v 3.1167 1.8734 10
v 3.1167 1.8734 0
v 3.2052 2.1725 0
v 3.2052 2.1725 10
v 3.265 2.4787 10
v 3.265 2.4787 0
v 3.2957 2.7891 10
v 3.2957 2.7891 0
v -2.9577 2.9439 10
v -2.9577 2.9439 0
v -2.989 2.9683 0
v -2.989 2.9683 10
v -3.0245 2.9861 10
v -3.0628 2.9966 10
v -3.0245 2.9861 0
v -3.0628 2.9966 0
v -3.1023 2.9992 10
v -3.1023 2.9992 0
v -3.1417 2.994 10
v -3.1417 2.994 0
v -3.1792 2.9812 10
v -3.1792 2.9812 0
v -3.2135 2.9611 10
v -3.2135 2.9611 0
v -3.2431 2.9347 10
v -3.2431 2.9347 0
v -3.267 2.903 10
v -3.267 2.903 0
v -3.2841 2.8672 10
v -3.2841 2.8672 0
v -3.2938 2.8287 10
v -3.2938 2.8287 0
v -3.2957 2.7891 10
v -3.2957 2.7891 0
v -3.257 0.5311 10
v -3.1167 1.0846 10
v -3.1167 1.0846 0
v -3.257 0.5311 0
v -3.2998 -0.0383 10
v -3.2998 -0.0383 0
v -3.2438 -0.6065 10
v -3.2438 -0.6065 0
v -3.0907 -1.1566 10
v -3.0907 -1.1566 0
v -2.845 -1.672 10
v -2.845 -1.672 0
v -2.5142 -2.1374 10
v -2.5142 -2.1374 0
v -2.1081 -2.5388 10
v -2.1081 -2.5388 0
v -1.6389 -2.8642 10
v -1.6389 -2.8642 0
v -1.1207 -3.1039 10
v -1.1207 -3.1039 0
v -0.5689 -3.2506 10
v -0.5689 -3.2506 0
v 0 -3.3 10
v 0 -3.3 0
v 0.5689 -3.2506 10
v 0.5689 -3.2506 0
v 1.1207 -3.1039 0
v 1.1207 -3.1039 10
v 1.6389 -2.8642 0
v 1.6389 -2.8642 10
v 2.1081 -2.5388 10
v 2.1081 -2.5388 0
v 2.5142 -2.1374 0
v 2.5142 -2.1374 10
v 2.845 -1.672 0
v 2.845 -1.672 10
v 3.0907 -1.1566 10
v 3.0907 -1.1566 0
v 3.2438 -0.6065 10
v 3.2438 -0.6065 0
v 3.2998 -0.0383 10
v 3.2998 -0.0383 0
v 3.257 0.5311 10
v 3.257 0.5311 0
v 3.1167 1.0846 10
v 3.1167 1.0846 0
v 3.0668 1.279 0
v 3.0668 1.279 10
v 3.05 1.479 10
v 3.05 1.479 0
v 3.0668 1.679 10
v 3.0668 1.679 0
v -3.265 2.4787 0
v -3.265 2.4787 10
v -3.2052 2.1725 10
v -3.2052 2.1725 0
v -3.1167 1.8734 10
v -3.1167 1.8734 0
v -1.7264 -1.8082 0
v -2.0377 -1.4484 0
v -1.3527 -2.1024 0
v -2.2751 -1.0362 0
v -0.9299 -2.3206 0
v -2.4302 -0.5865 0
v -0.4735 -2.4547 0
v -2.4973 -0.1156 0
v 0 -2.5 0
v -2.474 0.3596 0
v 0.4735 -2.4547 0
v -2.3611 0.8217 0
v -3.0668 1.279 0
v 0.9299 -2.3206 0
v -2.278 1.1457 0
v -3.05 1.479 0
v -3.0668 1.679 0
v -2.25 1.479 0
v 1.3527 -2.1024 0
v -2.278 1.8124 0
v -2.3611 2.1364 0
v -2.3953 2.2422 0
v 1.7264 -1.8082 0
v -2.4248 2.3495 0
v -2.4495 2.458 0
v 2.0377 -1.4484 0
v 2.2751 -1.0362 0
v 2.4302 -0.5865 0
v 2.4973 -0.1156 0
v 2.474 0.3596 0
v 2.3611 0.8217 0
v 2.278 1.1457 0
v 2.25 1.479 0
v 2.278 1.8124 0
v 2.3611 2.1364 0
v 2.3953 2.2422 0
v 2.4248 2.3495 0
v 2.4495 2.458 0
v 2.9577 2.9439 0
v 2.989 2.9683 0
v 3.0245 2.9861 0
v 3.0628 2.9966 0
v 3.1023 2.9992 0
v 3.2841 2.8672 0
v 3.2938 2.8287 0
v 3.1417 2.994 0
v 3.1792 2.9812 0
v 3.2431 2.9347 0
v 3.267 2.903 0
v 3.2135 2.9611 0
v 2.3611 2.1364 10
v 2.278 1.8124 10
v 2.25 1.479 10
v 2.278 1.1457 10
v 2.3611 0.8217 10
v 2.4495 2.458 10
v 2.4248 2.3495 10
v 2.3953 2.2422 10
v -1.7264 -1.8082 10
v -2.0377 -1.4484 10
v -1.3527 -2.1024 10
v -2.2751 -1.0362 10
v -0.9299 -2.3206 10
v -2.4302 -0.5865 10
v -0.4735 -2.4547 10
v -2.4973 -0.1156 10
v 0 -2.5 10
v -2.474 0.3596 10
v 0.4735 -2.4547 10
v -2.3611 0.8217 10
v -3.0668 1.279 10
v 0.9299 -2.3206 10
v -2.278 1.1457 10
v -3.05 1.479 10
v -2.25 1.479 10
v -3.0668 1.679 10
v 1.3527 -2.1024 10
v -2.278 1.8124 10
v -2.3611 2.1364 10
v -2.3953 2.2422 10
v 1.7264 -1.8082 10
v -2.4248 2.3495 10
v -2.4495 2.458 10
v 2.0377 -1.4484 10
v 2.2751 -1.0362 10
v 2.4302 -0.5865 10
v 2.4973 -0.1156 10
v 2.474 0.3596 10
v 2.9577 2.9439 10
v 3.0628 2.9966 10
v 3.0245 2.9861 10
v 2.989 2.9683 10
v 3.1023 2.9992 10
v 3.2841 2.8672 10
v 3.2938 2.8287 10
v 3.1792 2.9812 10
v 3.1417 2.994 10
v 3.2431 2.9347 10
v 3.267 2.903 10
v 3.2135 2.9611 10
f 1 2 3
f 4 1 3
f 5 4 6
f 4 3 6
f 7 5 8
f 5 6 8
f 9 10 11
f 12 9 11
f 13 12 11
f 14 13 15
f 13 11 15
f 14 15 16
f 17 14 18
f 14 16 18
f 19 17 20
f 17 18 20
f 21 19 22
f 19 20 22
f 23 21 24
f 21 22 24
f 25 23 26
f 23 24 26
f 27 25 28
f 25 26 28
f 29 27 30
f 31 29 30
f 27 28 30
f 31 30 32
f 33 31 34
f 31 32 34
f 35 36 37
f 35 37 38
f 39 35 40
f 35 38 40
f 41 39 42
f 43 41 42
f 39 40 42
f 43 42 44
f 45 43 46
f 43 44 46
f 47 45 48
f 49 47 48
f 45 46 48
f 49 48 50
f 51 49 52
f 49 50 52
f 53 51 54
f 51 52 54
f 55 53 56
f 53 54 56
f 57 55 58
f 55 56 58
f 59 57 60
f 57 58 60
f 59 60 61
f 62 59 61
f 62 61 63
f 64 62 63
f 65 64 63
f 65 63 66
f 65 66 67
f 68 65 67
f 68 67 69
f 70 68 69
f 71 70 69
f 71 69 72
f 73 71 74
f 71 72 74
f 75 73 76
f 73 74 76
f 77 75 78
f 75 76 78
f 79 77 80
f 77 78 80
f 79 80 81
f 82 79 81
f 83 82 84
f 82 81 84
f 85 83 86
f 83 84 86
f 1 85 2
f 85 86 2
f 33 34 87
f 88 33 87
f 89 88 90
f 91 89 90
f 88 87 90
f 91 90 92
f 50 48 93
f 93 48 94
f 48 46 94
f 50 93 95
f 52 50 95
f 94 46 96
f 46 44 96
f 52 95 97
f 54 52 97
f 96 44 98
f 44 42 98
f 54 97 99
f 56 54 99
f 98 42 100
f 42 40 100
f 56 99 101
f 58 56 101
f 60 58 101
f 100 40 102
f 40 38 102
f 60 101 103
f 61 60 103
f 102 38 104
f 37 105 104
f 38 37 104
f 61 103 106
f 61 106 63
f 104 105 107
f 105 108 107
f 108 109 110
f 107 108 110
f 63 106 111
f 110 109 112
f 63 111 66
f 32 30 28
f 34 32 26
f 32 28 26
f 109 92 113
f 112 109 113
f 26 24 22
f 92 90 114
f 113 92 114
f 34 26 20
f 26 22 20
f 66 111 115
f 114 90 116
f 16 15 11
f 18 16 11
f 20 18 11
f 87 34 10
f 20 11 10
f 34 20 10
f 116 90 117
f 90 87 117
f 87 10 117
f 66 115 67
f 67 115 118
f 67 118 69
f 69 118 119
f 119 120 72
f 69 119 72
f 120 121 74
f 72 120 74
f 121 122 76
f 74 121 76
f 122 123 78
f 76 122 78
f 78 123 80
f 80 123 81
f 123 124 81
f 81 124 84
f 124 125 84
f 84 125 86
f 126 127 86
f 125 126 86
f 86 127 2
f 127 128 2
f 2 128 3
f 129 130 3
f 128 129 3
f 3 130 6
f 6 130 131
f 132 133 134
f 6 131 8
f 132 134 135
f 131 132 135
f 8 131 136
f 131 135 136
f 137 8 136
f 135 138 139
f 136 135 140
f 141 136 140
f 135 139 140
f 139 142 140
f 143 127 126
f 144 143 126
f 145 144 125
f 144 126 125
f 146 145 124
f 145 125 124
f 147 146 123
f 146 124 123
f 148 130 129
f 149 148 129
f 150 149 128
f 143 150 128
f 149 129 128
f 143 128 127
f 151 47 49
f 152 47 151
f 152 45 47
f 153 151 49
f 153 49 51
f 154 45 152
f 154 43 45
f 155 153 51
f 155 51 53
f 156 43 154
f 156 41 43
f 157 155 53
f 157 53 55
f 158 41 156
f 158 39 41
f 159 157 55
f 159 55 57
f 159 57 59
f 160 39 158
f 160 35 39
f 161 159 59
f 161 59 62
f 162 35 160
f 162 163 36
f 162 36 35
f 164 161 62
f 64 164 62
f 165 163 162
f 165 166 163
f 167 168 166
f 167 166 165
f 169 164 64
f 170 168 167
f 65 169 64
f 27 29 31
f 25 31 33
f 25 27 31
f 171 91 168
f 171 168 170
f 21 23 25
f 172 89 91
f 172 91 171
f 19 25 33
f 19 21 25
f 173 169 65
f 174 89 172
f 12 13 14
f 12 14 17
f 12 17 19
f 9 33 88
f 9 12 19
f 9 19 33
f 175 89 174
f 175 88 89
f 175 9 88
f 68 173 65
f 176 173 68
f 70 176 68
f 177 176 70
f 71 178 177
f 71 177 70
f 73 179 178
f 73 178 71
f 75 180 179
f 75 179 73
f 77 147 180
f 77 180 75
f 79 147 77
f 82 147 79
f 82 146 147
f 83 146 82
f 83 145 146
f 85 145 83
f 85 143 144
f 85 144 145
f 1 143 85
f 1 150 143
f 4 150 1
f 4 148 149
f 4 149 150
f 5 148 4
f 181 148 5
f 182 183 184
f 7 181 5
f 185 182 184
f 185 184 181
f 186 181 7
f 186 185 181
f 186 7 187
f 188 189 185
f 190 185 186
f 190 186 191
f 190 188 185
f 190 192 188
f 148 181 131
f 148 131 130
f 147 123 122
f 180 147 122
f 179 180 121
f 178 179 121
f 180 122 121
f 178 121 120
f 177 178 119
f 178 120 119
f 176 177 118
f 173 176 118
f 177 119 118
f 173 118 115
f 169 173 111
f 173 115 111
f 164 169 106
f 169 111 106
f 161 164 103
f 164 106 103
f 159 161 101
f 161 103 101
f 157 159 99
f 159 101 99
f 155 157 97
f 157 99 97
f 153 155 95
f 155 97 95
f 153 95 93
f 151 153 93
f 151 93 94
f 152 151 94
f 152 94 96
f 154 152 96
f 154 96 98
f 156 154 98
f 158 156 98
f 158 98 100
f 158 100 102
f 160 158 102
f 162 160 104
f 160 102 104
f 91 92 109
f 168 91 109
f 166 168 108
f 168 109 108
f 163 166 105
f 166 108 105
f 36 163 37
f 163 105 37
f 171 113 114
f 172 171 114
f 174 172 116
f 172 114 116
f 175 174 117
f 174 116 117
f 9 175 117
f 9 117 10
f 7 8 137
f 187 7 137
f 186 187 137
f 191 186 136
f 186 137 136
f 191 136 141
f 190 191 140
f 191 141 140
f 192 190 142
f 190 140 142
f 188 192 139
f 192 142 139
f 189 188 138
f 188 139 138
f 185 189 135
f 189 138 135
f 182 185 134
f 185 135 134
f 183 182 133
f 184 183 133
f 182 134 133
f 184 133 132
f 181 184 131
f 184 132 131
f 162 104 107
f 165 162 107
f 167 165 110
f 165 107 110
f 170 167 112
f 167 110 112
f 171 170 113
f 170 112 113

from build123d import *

# Parameters (mm, degrees)
F1_DEPTH = 10


# Not quite as in the source:
# - a feature names something its author has since deleted; it is built from what else it names


with BuildPart() as f1:
    # F0 (on Top) → F1 (new body)
    with BuildSketch(Plane.XY):
        with BuildLine():
            ThreePointArc((2.3611111111, 0.8216777477), (0, -2.5), (-2.3611111111, 0.8216777477))
            ThreePointArc((-2.3611111111, 0.8216777477), (-2.25, 1.4790199458), (-2.3611111111, 2.1363621439))
            ThreePointArc((-2.3611111111, 2.1363621439), (-2.4106719576, 2.2957252286), (-2.4494897428, 2.4580398915))
            Line((-2.4494897428, 2.4580398915), (-2.9577320216, 2.9439046938))
            ThreePointArc((-2.9577320216, 2.9439046938), (-3.1792292558, 2.9811663012), (-3.2956726945, 2.7890976215))
            ThreePointArc((-3.2956726945, 2.7890976215), (-3.2386938705, 2.3249032452), (-3.1166666667, 1.8734252646))
            ThreePointArc((-3.1166666667, 1.8734252646), (-3.05, 1.4790199458), (-3.1166666667, 1.0846146269))
            ThreePointArc((-3.1166666667, 1.0846146269), (0, -3.3), (3.1166666667, 1.0846146269))
            ThreePointArc((3.1166666667, 1.0846146269), (3.05, 1.4790199458), (3.1166666667, 1.8734252646))
            ThreePointArc((3.1166666667, 1.8734252646), (3.2386938705, 2.3249032452), (3.2956726945, 2.7890976215))
            ThreePointArc((3.2956726945, 2.7890976215), (3.1792292558, 2.9811663012), (2.9577320216, 2.9439046938))
            Line((2.9577320216, 2.9439046938), (2.4494897428, 2.4580398915))
            ThreePointArc((2.4494897428, 2.4580398915), (2.4106719576, 2.2957252286), (2.3611111111, 2.1363621439))
            ThreePointArc((2.3611111111, 2.1363621439), (2.25, 1.4790199458), (2.3611111111, 0.8216777477))
        make_face()
    extrude(amount=F1_DEPTH)


solid = f1.part
